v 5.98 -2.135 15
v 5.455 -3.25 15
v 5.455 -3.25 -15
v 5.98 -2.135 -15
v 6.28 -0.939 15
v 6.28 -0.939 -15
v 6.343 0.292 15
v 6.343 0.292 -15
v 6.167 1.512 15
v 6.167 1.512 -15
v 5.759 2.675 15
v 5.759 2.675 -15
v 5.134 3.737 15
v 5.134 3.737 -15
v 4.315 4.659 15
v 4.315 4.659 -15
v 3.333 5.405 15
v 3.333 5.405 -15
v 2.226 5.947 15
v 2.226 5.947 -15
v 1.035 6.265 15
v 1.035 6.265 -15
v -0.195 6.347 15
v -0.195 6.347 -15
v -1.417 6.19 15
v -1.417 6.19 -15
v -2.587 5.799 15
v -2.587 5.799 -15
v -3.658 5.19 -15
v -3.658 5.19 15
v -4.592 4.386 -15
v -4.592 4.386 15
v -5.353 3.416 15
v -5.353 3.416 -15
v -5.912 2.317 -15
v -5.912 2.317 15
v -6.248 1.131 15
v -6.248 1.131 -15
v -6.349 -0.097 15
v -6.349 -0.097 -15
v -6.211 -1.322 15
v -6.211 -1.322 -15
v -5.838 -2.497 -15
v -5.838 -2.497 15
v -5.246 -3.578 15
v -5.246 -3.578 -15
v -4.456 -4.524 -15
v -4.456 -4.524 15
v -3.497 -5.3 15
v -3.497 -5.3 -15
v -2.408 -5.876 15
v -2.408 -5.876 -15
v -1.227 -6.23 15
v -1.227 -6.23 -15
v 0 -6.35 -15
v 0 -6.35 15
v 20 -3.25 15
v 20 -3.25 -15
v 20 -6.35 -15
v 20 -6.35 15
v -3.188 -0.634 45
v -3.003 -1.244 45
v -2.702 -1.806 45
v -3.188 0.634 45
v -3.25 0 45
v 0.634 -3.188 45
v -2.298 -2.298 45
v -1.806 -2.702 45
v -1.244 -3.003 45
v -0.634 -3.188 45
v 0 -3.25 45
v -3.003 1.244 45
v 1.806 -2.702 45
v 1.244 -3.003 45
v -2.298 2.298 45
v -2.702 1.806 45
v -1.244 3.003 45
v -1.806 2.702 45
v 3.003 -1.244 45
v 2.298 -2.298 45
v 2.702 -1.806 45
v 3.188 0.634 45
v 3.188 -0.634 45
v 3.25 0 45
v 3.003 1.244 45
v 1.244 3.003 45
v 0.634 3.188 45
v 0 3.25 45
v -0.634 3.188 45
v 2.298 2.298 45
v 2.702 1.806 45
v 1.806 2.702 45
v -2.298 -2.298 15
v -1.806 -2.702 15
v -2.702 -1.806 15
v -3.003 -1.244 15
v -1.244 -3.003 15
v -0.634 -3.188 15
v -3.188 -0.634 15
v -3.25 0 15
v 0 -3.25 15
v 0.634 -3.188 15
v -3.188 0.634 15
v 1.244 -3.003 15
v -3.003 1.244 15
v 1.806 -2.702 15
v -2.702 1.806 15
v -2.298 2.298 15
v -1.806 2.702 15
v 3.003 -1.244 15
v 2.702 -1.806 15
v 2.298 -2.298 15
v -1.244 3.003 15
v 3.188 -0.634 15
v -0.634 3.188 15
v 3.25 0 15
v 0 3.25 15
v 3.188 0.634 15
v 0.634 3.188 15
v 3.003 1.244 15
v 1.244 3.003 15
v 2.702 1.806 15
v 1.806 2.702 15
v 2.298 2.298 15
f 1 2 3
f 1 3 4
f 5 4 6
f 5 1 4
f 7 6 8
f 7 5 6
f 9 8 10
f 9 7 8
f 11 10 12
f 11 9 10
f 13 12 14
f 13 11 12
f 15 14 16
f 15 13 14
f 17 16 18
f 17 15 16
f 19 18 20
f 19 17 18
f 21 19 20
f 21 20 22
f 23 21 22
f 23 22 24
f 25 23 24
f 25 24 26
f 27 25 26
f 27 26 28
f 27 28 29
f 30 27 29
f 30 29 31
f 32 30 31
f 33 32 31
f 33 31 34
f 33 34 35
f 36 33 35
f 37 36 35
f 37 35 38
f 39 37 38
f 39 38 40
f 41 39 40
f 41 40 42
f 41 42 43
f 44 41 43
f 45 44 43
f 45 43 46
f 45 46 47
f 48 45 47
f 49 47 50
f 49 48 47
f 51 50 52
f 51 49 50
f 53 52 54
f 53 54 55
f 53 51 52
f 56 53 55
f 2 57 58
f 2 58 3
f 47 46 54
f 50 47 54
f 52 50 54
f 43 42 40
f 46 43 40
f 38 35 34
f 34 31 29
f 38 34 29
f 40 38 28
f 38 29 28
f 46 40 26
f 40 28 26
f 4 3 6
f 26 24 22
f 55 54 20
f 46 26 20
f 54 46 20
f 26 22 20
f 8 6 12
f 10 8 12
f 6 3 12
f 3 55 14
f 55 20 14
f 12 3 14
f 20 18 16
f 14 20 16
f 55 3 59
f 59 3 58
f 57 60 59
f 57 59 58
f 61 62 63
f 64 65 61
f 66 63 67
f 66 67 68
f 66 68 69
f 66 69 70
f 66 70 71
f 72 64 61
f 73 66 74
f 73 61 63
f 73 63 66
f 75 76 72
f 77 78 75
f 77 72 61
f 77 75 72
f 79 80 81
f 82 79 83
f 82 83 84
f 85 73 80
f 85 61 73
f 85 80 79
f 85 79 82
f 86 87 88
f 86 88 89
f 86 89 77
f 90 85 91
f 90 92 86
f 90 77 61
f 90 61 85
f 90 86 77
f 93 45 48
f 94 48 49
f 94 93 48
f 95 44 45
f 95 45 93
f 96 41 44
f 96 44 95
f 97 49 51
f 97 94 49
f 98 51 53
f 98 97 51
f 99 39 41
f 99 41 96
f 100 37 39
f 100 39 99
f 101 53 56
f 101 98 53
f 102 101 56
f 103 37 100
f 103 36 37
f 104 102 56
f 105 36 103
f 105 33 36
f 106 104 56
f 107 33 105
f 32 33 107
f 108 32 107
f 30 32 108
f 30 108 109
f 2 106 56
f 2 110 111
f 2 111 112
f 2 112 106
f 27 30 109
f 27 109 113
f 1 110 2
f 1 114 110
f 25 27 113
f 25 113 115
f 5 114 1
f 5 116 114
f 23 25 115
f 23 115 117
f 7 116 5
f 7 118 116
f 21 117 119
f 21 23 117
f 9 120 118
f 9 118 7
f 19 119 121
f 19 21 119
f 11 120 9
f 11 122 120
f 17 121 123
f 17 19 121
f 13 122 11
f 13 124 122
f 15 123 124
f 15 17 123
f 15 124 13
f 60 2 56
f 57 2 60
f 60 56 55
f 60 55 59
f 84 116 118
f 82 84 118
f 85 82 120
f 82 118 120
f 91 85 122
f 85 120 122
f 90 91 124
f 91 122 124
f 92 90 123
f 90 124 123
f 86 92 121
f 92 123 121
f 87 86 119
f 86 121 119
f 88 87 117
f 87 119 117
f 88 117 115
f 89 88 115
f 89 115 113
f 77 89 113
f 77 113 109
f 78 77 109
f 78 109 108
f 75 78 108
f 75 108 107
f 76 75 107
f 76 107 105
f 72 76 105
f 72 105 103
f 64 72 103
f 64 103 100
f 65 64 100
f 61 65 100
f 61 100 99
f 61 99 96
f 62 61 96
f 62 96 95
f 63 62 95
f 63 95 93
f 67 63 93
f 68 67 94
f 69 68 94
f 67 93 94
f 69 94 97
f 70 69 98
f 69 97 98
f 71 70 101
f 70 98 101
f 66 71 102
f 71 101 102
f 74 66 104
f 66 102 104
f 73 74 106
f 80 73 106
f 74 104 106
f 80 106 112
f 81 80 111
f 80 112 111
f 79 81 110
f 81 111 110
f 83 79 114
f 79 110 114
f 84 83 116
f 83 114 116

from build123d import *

# Parameters (mm, degrees)
ESBO_O1_R                = 6.35
RESSALTO_EXTRUS_O1_DEPTH = 15
ESBO_O2_W                = 20
ESBO_O2_H                = 3.1
RESSALTO_EXTRUS_O2_DEPTH = 30
ESBO_O1_3_R              = 3.25
RESSALTO_EXTRUS_O3_DEPTH = 45


with BuildPart() as part:
    # Esboço1 → Ressalto-extrusão1 (new, symmetric)
    with BuildSketch(Plane.XY):
        Circle(ESBO_O1_R)
    extrude(amount=RESSALTO_EXTRUS_O1_DEPTH, both=True)

    # Esboço2 → Ressalto-extrusão2 (add)
    with BuildSketch(Plane.XY.offset(15)):
        with Locations((10, -4.8)):
            Rectangle(ESBO_O2_W, ESBO_O2_H)
    extrude(amount=-RESSALTO_EXTRUS_O2_DEPTH)

    # Esboço1<3> → Ressalto-extrusão3 (add)
    with BuildSketch(Plane.XY):
        Circle(ESBO_O1_3_R)
    extrude(amount=RESSALTO_EXTRUS_O3_DEPTH)


solid = part.part
